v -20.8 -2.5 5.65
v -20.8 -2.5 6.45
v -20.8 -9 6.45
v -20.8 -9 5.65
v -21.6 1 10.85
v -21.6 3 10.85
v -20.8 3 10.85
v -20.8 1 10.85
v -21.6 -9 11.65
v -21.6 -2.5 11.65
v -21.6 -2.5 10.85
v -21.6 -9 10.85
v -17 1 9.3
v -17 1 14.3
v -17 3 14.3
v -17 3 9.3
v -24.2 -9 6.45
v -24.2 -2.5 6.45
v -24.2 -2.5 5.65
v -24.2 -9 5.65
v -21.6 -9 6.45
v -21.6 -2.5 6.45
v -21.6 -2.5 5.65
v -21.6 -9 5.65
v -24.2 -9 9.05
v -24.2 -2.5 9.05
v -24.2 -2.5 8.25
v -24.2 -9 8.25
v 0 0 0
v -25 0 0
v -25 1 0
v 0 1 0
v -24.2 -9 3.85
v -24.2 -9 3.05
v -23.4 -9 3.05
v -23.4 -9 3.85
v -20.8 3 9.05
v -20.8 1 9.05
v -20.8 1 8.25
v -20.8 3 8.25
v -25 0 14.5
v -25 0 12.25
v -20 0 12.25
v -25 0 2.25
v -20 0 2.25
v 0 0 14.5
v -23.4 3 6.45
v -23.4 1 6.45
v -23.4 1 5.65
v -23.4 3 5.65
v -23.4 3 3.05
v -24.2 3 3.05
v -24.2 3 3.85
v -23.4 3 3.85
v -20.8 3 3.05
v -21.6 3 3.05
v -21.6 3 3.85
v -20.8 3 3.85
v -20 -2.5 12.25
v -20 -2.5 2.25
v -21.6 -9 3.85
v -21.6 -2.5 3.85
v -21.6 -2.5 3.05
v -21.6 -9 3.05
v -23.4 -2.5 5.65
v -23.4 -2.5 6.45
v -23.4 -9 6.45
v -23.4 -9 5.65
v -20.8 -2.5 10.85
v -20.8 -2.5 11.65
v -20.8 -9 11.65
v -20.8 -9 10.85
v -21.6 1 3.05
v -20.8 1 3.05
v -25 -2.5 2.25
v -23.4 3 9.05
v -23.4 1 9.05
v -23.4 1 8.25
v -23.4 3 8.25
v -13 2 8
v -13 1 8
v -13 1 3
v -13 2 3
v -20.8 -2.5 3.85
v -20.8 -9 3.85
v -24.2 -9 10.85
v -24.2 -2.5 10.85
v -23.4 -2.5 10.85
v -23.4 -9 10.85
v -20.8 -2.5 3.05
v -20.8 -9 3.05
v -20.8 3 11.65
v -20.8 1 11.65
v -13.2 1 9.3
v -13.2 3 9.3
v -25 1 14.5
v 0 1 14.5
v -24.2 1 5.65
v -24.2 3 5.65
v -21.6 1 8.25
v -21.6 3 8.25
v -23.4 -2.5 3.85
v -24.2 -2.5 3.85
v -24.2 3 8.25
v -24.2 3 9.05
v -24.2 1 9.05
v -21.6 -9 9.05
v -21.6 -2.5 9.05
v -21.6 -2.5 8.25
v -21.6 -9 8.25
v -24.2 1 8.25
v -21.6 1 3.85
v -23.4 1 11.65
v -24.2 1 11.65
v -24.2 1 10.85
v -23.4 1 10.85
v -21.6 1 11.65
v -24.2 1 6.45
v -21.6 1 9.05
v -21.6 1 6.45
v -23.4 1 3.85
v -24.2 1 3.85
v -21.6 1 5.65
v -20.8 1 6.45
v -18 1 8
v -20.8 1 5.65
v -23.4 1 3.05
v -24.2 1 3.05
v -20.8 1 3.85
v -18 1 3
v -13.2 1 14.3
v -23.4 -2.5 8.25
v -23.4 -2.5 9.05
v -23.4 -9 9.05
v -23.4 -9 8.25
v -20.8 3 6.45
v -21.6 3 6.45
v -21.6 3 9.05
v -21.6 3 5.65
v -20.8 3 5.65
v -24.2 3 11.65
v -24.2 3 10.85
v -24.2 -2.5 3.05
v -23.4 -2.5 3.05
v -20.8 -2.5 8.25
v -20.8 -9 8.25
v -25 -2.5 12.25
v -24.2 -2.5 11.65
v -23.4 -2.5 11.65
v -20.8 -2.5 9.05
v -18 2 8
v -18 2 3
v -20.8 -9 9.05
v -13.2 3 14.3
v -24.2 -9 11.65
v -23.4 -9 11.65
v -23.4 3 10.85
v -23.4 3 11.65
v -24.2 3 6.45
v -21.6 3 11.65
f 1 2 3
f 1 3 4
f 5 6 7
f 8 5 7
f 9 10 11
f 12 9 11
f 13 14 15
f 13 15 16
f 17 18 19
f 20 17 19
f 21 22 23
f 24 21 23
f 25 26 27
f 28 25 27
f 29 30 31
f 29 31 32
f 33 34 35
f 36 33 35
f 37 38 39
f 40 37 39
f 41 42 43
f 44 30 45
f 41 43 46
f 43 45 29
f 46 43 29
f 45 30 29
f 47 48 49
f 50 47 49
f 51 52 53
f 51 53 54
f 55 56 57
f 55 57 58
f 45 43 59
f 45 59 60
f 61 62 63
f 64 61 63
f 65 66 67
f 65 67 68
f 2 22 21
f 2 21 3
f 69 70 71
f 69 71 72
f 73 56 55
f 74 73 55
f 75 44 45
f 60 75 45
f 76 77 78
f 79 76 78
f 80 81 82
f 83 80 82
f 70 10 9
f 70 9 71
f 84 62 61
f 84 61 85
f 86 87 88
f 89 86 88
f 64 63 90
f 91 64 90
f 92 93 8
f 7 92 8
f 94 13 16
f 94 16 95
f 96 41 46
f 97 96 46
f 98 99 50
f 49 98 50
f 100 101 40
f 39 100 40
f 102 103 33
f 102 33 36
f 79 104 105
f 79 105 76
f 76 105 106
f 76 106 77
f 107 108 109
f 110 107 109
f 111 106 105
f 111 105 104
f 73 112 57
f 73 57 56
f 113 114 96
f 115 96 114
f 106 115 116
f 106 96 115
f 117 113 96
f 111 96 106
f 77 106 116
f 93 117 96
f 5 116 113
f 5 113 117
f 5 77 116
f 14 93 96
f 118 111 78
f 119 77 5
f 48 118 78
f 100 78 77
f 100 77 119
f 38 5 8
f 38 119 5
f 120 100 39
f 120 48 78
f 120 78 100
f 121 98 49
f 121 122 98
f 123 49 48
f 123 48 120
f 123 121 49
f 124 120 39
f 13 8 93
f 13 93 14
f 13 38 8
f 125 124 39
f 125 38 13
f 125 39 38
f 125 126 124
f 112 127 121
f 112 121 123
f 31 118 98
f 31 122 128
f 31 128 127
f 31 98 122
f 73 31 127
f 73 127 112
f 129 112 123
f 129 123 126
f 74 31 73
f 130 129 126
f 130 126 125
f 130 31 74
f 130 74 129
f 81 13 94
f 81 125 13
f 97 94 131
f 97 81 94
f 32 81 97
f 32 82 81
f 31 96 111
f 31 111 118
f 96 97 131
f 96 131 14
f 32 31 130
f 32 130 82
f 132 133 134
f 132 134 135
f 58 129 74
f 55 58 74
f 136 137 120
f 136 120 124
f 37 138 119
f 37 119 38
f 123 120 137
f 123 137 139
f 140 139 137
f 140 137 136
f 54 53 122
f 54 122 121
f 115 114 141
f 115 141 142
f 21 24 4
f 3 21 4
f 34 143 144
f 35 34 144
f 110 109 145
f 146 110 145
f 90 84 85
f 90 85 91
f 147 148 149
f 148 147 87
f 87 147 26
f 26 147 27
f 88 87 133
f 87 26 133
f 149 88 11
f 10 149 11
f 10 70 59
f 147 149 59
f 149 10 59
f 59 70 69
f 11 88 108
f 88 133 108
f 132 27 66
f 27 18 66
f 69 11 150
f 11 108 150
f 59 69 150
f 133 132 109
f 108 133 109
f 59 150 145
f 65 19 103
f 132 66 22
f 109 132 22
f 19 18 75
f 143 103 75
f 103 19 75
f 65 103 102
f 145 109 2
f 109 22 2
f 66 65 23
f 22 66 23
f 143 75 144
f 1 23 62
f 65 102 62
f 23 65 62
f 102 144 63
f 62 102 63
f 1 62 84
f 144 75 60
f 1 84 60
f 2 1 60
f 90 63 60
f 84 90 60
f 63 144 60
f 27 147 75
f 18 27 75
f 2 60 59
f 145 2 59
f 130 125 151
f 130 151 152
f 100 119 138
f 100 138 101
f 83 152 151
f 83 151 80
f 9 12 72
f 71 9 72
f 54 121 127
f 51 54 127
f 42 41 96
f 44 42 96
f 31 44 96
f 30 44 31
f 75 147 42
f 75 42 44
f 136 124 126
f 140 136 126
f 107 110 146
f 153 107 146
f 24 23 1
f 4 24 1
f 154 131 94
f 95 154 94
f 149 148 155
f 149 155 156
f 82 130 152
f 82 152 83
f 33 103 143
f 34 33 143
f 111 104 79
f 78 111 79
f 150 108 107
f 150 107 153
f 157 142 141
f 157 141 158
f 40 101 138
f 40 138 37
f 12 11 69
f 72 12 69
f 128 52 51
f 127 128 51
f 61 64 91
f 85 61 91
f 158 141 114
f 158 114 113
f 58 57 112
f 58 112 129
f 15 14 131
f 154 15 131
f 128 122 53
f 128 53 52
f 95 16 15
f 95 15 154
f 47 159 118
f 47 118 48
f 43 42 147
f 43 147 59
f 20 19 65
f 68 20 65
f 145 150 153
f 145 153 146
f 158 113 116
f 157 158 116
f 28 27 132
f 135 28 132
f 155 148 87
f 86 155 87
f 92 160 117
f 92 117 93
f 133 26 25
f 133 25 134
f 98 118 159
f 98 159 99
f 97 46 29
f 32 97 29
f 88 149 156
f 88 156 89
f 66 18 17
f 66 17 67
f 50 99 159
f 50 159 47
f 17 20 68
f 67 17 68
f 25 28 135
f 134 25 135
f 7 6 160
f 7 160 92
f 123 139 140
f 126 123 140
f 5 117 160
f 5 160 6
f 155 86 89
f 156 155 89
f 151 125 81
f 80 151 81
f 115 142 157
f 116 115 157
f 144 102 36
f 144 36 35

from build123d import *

# Parameters (mm, degrees)
ESQUISSE1_W        = 25
ESQUISSE1_H        = 14.5
BOSS_EXTRU_1_DEPTH = 1
ESQUISSE2_W        = 3.8
ESQUISSE2_H        = 5
BOSS_EXTRU_2_DEPTH = 2
ESQUISSE2_3_W      = 5
ESQUISSE2_3_H      = 5
BOSS_EXTRU_3_DEPTH = 1
BOSS_EXTRU_4_START = -1
ESQUISSE2_4_W      = 5
ESQUISSE2_4_H      = 10
BOSS_EXTRU_4_DEPTH = 2.5
BOSS_EXTRU_5_START = -3.5
ESQUISSE2_5_W      = 0.8
ESQUISSE2_5_H      = 0.8
BOSS_EXTRU_5_DEPTH = 6.5
ESQUISSE2_6_W      = 0.8
ESQUISSE2_6_H      = 0.8
BOSS_EXTRU_6_DEPTH = 2


with BuildPart() as part:
    # Esquisse1 → Boss.-Extru.1 (new body)
    with BuildSketch(Plane(origin=(0, 0, 0), x_dir=(1, 0, 0), z_dir=(0, 1, 0))):
        with Locations((-12.5, -7.25)):
            Rectangle(ESQUISSE1_W, ESQUISSE1_H)
    extrude(amount=BOSS_EXTRU_1_DEPTH)

    # Esquisse2 → Boss.-Extru.2 (add)
    with BuildSketch(Plane(origin=(0, 1, 0), x_dir=(1, 0, 0), z_dir=(0, 1, 0))):
        with Locations((-15.1, -11.8)):
            Rectangle(ESQUISSE2_W, ESQUISSE2_H)
    extrude(amount=BOSS_EXTRU_2_DEPTH)

    # Esquisse2<3> → Boss.-Extru.3 (add)
    with BuildSketch(Plane(origin=(0, 1, 0), x_dir=(1, 0, 0), z_dir=(0, 1, 0))):
        with Locations((-15.5, -5.5)):
            Rectangle(ESQUISSE2_3_W, ESQUISSE2_3_H)
    extrude(amount=BOSS_EXTRU_3_DEPTH)

    # Esquisse2<4> → Boss.-Extru.4 (add)
    with BuildSketch(Plane(origin=(0, 1, 0), x_dir=(1, 0, 0), z_dir=(0, 1, 0)).offset(BOSS_EXTRU_4_START)):
        with Locations((-22.5, -7.25)):
            Rectangle(ESQUISSE2_4_W, ESQUISSE2_4_H)
    extrude(amount=-BOSS_EXTRU_4_DEPTH)

    # Esquisse2<5> → Boss.-Extru.5 (add)
    with BuildSketch(Plane(origin=(0, 1, 0), x_dir=(1, 0, 0), z_dir=(0, 1, 0)).offset(BOSS_EXTRU_5_START)):
        with Locations((-23.8, -3.45)):
            Rectangle(ESQUISSE2_5_W, ESQUISSE2_5_H)
        with Locations((-21.2, -3.45)):
            Rectangle(ESQUISSE2_5_W, ESQUISSE2_5_H)
        with Locations((-21.2, -6.05)):
            Rectangle(ESQUISSE2_5_W, ESQUISSE2_5_H)
        with Locations((-21.2, -8.65)):
            Rectangle(ESQUISSE2_5_W, ESQUISSE2_5_H)
        with Locations((-21.2, -11.25)):
            Rectangle(ESQUISSE2_5_W, ESQUISSE2_5_H)
        with Locations((-23.8, -11.25)):
            Rectangle(ESQUISSE2_5_W, ESQUISSE2_5_H)
        with Locations((-23.8, -6.05)):
            Rectangle(ESQUISSE2_5_W, ESQUISSE2_5_H)
        with Locations((-23.8, -8.65)):
            Rectangle(ESQUISSE2_5_W, ESQUISSE2_5_H)
    extrude(amount=-BOSS_EXTRU_5_DEPTH)

    # Esquisse2<6> → Boss.-Extru.6 (add)
    with BuildSketch(Plane(origin=(0, 1, 0), x_dir=(1, 0, 0), z_dir=(0, 1, 0))):
        with Locations((-23.8, -3.45)):
            Rectangle(ESQUISSE2_6_W, ESQUISSE2_6_H)
        with Locations((-21.2, -3.45)):
            Rectangle(ESQUISSE2_6_W, ESQUISSE2_6_H)
        with Locations((-21.2, -6.05)):
            Rectangle(ESQUISSE2_6_W, ESQUISSE2_6_H)
        with Locations((-23.8, -6.05)):
            Rectangle(ESQUISSE2_6_W, ESQUISSE2_6_H)
        with Locations((-23.8, -8.65)):
            Rectangle(ESQUISSE2_6_W, ESQUISSE2_6_H)
        with Locations((-21.2, -8.65)):
            Rectangle(ESQUISSE2_6_W, ESQUISSE2_6_H)
        with Locations((-21.2, -11.25)):
            Rectangle(ESQUISSE2_6_W, ESQUISSE2_6_H)
        with Locations((-23.8, -11.25)):
            Rectangle(ESQUISSE2_6_W, ESQUISSE2_6_H)
    extrude(amount=BOSS_EXTRU_6_DEPTH)


solid = part.part
